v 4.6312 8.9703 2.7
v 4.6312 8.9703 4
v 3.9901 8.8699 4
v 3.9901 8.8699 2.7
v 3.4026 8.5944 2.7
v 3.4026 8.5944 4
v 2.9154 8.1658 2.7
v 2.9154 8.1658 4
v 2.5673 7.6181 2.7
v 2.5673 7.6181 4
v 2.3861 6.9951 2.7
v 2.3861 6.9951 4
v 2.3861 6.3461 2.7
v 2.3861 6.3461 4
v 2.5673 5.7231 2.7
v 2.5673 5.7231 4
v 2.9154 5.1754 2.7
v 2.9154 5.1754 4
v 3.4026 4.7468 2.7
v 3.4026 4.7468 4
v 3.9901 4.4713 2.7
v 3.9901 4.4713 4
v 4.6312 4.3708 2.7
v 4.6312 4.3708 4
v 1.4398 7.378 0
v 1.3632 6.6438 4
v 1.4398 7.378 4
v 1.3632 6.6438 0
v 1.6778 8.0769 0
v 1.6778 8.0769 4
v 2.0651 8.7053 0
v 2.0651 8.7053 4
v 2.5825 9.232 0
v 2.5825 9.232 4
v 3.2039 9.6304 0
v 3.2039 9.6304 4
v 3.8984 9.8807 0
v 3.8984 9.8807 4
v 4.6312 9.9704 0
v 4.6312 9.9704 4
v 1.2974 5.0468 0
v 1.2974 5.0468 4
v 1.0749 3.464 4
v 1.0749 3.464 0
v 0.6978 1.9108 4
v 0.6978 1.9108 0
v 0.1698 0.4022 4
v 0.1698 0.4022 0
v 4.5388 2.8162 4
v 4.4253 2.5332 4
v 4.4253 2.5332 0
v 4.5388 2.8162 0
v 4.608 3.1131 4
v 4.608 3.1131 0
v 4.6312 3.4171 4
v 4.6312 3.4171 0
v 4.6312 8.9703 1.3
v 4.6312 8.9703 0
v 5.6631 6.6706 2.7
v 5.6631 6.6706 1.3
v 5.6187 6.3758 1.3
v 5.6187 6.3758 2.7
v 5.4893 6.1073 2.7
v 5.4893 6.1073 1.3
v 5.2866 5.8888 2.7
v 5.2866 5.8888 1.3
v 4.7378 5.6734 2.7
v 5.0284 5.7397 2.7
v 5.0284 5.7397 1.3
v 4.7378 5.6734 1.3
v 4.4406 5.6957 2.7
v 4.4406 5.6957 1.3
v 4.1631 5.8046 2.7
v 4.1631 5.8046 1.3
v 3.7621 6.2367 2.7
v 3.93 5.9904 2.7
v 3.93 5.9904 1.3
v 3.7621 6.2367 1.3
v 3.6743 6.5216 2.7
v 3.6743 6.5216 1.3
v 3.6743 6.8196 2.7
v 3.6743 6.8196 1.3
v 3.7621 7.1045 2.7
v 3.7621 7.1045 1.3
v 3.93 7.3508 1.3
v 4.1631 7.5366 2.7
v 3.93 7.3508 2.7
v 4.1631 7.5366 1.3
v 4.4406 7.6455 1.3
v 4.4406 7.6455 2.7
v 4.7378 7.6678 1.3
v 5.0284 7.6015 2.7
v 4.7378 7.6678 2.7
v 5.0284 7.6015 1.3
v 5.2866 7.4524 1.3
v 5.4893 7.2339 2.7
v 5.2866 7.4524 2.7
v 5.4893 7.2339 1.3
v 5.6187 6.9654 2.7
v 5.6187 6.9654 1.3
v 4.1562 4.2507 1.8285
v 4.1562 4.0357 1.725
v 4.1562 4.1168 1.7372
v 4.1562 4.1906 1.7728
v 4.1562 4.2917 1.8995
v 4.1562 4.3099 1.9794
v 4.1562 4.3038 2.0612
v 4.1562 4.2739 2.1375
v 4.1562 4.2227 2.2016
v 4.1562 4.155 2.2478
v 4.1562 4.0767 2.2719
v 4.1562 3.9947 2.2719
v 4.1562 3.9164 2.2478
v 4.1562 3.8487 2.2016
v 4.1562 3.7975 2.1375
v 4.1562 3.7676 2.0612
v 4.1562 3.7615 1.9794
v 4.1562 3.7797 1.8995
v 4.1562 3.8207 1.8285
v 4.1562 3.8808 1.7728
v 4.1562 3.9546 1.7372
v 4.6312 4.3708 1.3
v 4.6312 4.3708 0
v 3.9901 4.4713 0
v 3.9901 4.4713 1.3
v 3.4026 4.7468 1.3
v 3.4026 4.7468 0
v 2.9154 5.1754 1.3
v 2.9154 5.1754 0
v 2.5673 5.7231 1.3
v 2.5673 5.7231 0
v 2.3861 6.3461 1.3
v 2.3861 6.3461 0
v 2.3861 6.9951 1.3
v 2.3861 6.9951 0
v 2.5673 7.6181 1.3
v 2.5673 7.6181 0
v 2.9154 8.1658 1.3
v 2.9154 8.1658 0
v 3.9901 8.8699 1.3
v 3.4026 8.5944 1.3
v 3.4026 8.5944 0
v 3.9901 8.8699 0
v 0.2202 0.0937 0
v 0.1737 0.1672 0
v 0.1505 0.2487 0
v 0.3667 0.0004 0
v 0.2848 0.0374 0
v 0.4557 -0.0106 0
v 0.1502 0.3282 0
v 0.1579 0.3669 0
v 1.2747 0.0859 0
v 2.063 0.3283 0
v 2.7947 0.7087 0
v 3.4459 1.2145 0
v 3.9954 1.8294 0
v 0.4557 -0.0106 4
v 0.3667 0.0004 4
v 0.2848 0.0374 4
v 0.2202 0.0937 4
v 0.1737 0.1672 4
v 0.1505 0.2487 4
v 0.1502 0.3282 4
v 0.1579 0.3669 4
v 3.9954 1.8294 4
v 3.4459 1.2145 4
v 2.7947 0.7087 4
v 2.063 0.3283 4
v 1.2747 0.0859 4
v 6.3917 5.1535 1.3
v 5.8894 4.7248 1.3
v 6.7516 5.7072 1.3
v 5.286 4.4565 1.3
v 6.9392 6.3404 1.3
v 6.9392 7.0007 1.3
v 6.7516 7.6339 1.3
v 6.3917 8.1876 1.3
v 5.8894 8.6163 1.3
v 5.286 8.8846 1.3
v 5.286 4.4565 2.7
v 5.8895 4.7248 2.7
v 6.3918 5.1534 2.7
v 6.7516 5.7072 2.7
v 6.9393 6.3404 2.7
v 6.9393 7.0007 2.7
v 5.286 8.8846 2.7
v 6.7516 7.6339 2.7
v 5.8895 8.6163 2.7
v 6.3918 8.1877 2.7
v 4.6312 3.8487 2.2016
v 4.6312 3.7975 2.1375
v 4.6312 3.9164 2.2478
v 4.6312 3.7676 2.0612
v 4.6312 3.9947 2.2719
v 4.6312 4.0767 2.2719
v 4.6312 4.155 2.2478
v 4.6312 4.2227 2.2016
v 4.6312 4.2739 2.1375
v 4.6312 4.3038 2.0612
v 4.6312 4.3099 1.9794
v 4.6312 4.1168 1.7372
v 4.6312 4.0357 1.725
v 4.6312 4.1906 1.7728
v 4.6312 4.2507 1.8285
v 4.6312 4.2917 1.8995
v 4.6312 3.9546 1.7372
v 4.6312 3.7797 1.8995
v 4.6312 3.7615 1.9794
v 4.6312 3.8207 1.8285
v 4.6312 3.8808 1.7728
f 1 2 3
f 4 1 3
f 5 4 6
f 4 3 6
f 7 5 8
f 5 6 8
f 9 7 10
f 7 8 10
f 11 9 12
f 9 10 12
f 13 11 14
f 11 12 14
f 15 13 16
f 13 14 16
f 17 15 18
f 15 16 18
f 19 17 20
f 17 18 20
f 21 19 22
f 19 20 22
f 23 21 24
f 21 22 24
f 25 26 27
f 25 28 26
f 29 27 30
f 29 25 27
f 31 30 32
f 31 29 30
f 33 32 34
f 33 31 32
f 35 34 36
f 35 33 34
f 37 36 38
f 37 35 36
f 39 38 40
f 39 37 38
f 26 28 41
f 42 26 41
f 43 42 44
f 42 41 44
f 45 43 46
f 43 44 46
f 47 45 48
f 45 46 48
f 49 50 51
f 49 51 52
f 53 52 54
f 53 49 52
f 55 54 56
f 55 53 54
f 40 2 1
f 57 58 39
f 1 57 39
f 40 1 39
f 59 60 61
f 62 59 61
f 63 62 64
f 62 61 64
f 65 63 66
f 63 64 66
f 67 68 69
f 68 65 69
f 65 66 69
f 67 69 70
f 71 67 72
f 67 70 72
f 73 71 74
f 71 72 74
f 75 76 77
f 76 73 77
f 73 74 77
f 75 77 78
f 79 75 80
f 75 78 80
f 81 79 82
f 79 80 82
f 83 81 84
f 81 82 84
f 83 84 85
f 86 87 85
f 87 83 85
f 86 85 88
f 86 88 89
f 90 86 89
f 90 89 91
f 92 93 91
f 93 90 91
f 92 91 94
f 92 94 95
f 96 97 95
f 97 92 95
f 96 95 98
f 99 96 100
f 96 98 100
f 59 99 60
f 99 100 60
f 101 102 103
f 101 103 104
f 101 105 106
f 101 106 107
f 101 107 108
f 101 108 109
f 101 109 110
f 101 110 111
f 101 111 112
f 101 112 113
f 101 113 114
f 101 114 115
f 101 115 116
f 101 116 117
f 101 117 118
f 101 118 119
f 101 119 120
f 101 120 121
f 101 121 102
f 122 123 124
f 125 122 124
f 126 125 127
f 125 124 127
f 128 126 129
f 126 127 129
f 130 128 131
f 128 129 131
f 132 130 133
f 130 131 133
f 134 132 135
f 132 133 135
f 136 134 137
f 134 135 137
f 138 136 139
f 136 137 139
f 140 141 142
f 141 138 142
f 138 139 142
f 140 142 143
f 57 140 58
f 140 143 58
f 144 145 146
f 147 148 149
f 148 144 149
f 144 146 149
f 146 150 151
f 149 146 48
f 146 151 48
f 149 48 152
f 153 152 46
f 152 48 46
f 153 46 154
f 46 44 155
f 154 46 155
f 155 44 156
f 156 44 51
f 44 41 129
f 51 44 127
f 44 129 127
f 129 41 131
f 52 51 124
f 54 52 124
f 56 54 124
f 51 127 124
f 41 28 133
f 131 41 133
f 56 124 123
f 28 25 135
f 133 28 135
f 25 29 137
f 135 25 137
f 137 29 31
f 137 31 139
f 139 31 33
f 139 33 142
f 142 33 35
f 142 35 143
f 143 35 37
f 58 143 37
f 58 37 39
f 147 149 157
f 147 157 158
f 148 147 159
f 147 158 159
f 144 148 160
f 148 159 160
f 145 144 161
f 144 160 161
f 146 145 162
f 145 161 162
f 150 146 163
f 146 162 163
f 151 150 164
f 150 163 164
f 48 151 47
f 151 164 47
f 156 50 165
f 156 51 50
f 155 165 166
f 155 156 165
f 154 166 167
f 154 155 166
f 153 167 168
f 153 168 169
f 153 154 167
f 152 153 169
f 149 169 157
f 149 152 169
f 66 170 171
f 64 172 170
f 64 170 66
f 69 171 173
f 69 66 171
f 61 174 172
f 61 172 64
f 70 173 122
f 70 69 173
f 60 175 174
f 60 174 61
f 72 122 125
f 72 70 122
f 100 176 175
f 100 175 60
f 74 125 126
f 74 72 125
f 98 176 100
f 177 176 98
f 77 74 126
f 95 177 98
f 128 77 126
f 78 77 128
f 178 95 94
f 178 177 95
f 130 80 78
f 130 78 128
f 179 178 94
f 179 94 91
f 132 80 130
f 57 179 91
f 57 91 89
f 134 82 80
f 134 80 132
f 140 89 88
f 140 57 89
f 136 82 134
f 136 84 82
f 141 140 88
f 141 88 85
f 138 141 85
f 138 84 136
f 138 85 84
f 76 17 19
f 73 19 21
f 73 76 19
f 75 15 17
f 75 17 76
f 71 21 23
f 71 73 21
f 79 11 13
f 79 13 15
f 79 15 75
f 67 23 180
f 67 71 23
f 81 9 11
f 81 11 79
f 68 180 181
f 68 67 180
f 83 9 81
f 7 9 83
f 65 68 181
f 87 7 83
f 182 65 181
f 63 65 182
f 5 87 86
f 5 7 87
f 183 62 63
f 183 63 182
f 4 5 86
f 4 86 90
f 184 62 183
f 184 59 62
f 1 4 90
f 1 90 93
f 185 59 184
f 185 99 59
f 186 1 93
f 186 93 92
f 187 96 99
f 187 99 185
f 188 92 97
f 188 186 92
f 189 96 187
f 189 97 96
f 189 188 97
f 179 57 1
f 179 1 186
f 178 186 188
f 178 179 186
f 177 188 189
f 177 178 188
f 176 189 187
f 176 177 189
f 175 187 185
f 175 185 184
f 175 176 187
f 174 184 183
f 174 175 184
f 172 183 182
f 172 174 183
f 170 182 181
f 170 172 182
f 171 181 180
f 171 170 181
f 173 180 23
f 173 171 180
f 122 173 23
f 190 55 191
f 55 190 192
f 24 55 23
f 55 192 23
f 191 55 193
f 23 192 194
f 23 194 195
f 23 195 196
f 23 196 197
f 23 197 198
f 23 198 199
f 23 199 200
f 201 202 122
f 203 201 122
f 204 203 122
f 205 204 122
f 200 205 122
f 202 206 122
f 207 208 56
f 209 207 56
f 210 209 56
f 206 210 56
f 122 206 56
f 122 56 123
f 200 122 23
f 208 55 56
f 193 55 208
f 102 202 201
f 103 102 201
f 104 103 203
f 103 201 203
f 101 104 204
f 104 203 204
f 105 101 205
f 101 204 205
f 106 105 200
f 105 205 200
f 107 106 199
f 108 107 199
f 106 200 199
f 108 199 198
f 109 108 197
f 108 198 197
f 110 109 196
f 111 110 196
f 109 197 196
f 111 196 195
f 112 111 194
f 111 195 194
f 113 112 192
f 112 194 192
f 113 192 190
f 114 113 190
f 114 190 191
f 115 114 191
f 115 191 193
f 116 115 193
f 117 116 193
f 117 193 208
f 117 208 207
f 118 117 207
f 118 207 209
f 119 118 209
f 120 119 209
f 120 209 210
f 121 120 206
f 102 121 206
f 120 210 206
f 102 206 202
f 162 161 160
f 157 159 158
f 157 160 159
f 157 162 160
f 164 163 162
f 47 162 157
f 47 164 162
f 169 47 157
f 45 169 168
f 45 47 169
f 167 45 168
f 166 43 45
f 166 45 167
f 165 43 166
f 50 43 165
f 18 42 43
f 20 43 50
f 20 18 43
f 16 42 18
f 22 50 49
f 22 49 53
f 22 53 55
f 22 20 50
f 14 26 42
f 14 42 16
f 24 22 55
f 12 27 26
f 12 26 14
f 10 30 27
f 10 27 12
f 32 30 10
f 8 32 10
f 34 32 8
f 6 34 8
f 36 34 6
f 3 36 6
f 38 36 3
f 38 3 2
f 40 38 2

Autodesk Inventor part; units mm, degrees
ref_plane "YZ Plane" through (0, 0, 0) normal (1, 0, 0) x (0, 1, 0)
ref_plane "XZ Plane" through (0, 0, 0) normal (0, 1, 0) x (-1, 0, 0)
sketch "Sketch1" plane through (0, 0, 0) normal (0, 0, 1) x (1, 0, 0)
  line L0 (0, 0) -> (9.3091, 0)
  line L1 (9.3091, 0) -> (9.3091, 10)
  line L2 (9.3091, 10) -> (0, 10)
  line L3 (0, 10) -> (0, 0)
  circle A0 centre (4.6631, 6.6706) radius 2.3
  circle A1 centre (4.6631, 6.6706) radius 1
  line L4 (4.6312, 3.0206) -> (4.6312, 4.3708)
  line L5 (4.6312, 8.9703) -> (4.6312, 9.9704)
  arc A2 (4.6312, 9.9704) -> (1.3632, 6.6438) centre (4.6631, 6.6706) ccw
  arc A3 (4.639, 4.4786) -> (4.6548, 4.4787) centre (4.6389, 7.7786) ccw
  arc A4 (0, 0) -> (1.3632, 6.6438) centre (-14.8677, 6.5123) ccw
  arc A5 (0, 0) -> (4.6312, 3.0206) centre (0.3336, 4.5492) ccw
  dimension "d0" = 10
  dimension "d1" = 4.6
  dimension "d2" = 2
extrude "Extrusion1" add sketch "Sketch1" along normal blind 4 contours A4 A2 L5 A0 L4 A5 L0 | L0 A5 | A0
fillet "Fillet1" radius 2 1 edges at (4.6312, 3.0206, 2)
sketch "Sketch2" plane through (0, 0, 4) normal (0, 0, 1) x (1, 0, 0)
  line L0 (4.6312, 3.4171) -> (4.6312, 4.3708) projected
  arc A0 (4.6312, 4.3708) -> (4.6312, 8.9703) centre (4.6631, 6.6706) ccw projected
  line L1 (4.6312, 8.9703) -> (4.6312, 9.9704) projected
  arc A1 (4.6312, 9.9704) -> (1.3632, 6.6438) centre (4.6631, 6.6706) ccw projected
  circle A2 centre (4.6631, 6.6706) radius 1 projected
  circle A3 centre (4.6631, 6.6706) radius 2.3
  arc A4 (4.4253, 2.5332) -> (4.6312, 3.4171) centre (2.6312, 3.4171) ccw projected
  arc A5 (0, 0) -> (1.3632, 6.6438) centre (-14.8677, 6.5123) ccw projected
  arc A6 (0, 0) -> (4.4253, 2.5332) centre (0.3336, 4.5492) ccw projected
extrude "Extrusion2" cut sketch "Sketch2" against normal blind 1.3 contours A3 A0
sketch "Sketch3" plane through (0, 0, 0) normal (0, 0, -1) x (-1, 0, 0)
  arc A0 (-1.3632, 6.6438) -> (-4.6312, 9.9704) centre (-4.6631, 6.6706) ccw projected
  line L0 (-4.6312, 8.9703) -> (-4.6312, 9.9704) projected
  arc A1 (-4.6312, 8.9703) -> (-4.6312, 4.3708) centre (-4.6631, 6.6706) ccw projected
  line L1 (-4.6312, 3.4171) -> (-4.6312, 4.3708) projected
  circle A2 centre (-4.6631, 6.6706) radius 1 projected
  circle A3 centre (-4.6631, 6.6706) radius 2.3
  arc A4 (-4.6312, 3.4171) -> (-4.4253, 2.5332) centre (-2.6312, 3.4171) ccw projected
  arc A5 (-4.4253, 2.5332) -> (0, 0) centre (-0.3336, 4.5492) ccw projected
  arc A6 (-1.3632, 6.6438) -> (0, 0) centre (14.8677, 6.5123) ccw projected
extrude "Extrusion3" cut sketch "Sketch3" against normal blind 1.3 contours A3 A1
ref_plane "Work Plane5" through (4.6312, 3.8939, 0) normal (1, 0, 0) x (0, 0, -1)
sketch "Sketch6" plane through (4.6312, 3.8939, 0) normal (1, 0, 0) x (0, 0, -1)
  line L0 (0, -0.4768) -> (0, 0.4768) projected
  line L1 (0, 0.4768) -> (-1.3, 0.4768) projected
  line L2 (-1.3, 0.4768) -> (-2.7, 0.4768) projected
  line L3 (-2.7, 0.4768) -> (-4, 0.4768) projected
  line L4 (-4, -0.4768) -> (-4, 0.4768) projected
  circle A0 centre (-2, 0.1418) radius 0.275
  line L5 (-4, -0.4768) -> (-4, 0.4768) projected
  line L6 (0, -0.4768) -> (-4, -0.4768) projected
  line L7 (0, -0.4768) -> (0, 0.4768) projected
  line L8 (-4, 0.4768) -> (0, 0.4768)
  line L9 (0, 0.4768) -> (0, -0.1932)
  line L10 (0, -0.1932) -> (-4, -0.1932)
  line L11 (-4, -0.1932) -> (-4, 0.4768)
  line L12 (-4, 0.4768) -> (0, -0.1932) construction
  line L13 (-4, -0.1932) -> (0, 0.4768) construction
  point P0 (0, -3.8939)
  dimension "d22" = 0.55
  dimension "d26" = 0.67
extrude "Extrusion6" cut sketch "Sketch6" against normal blind 0.475 contours A0
fillet "Fillet2" radius 0.3 1 edges at (0, 0, 2)
properties material "Liga de Nickel-Copper 400"
